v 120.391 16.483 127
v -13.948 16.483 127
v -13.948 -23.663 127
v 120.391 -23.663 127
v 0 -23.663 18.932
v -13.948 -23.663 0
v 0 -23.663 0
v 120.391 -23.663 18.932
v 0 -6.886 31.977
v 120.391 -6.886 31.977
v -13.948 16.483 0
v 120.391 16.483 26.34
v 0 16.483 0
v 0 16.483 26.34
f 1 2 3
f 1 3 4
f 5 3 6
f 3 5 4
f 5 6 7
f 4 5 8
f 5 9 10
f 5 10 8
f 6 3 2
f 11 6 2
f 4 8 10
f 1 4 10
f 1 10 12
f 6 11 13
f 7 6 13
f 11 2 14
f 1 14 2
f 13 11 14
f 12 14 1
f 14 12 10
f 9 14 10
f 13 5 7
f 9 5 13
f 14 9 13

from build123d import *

# Parameters (mm, degrees)
F0_W     = 134.338587
F0_H     = 40.145545
F1_DEPTH = 127
F3_DEPTH = 120.391601


with BuildPart() as f1:
    # F0 (on Top) → F1 (new body)
    with BuildSketch(Plane.XY):
        with Locations((53.221307, -3.590211)):
            Rectangle(F0_W, F0_H)
    extrude(amount=F1_DEPTH)

    # F2 (on Right) → F3 (cut, through all)
    with BuildSketch(Plane.YZ):
        Polygon((20.078405, -25.822868), (32.707811, -0.402366), (20.707569, 25.321126), (-6.885895, 31.977293), (-29.29414, 14.553907), (-29.6433, -13.828869), (-7.67045, -31.798224), align=None)
    extrude(amount=F3_DEPTH, mode=Mode.SUBTRACT)


solid = f1.part
